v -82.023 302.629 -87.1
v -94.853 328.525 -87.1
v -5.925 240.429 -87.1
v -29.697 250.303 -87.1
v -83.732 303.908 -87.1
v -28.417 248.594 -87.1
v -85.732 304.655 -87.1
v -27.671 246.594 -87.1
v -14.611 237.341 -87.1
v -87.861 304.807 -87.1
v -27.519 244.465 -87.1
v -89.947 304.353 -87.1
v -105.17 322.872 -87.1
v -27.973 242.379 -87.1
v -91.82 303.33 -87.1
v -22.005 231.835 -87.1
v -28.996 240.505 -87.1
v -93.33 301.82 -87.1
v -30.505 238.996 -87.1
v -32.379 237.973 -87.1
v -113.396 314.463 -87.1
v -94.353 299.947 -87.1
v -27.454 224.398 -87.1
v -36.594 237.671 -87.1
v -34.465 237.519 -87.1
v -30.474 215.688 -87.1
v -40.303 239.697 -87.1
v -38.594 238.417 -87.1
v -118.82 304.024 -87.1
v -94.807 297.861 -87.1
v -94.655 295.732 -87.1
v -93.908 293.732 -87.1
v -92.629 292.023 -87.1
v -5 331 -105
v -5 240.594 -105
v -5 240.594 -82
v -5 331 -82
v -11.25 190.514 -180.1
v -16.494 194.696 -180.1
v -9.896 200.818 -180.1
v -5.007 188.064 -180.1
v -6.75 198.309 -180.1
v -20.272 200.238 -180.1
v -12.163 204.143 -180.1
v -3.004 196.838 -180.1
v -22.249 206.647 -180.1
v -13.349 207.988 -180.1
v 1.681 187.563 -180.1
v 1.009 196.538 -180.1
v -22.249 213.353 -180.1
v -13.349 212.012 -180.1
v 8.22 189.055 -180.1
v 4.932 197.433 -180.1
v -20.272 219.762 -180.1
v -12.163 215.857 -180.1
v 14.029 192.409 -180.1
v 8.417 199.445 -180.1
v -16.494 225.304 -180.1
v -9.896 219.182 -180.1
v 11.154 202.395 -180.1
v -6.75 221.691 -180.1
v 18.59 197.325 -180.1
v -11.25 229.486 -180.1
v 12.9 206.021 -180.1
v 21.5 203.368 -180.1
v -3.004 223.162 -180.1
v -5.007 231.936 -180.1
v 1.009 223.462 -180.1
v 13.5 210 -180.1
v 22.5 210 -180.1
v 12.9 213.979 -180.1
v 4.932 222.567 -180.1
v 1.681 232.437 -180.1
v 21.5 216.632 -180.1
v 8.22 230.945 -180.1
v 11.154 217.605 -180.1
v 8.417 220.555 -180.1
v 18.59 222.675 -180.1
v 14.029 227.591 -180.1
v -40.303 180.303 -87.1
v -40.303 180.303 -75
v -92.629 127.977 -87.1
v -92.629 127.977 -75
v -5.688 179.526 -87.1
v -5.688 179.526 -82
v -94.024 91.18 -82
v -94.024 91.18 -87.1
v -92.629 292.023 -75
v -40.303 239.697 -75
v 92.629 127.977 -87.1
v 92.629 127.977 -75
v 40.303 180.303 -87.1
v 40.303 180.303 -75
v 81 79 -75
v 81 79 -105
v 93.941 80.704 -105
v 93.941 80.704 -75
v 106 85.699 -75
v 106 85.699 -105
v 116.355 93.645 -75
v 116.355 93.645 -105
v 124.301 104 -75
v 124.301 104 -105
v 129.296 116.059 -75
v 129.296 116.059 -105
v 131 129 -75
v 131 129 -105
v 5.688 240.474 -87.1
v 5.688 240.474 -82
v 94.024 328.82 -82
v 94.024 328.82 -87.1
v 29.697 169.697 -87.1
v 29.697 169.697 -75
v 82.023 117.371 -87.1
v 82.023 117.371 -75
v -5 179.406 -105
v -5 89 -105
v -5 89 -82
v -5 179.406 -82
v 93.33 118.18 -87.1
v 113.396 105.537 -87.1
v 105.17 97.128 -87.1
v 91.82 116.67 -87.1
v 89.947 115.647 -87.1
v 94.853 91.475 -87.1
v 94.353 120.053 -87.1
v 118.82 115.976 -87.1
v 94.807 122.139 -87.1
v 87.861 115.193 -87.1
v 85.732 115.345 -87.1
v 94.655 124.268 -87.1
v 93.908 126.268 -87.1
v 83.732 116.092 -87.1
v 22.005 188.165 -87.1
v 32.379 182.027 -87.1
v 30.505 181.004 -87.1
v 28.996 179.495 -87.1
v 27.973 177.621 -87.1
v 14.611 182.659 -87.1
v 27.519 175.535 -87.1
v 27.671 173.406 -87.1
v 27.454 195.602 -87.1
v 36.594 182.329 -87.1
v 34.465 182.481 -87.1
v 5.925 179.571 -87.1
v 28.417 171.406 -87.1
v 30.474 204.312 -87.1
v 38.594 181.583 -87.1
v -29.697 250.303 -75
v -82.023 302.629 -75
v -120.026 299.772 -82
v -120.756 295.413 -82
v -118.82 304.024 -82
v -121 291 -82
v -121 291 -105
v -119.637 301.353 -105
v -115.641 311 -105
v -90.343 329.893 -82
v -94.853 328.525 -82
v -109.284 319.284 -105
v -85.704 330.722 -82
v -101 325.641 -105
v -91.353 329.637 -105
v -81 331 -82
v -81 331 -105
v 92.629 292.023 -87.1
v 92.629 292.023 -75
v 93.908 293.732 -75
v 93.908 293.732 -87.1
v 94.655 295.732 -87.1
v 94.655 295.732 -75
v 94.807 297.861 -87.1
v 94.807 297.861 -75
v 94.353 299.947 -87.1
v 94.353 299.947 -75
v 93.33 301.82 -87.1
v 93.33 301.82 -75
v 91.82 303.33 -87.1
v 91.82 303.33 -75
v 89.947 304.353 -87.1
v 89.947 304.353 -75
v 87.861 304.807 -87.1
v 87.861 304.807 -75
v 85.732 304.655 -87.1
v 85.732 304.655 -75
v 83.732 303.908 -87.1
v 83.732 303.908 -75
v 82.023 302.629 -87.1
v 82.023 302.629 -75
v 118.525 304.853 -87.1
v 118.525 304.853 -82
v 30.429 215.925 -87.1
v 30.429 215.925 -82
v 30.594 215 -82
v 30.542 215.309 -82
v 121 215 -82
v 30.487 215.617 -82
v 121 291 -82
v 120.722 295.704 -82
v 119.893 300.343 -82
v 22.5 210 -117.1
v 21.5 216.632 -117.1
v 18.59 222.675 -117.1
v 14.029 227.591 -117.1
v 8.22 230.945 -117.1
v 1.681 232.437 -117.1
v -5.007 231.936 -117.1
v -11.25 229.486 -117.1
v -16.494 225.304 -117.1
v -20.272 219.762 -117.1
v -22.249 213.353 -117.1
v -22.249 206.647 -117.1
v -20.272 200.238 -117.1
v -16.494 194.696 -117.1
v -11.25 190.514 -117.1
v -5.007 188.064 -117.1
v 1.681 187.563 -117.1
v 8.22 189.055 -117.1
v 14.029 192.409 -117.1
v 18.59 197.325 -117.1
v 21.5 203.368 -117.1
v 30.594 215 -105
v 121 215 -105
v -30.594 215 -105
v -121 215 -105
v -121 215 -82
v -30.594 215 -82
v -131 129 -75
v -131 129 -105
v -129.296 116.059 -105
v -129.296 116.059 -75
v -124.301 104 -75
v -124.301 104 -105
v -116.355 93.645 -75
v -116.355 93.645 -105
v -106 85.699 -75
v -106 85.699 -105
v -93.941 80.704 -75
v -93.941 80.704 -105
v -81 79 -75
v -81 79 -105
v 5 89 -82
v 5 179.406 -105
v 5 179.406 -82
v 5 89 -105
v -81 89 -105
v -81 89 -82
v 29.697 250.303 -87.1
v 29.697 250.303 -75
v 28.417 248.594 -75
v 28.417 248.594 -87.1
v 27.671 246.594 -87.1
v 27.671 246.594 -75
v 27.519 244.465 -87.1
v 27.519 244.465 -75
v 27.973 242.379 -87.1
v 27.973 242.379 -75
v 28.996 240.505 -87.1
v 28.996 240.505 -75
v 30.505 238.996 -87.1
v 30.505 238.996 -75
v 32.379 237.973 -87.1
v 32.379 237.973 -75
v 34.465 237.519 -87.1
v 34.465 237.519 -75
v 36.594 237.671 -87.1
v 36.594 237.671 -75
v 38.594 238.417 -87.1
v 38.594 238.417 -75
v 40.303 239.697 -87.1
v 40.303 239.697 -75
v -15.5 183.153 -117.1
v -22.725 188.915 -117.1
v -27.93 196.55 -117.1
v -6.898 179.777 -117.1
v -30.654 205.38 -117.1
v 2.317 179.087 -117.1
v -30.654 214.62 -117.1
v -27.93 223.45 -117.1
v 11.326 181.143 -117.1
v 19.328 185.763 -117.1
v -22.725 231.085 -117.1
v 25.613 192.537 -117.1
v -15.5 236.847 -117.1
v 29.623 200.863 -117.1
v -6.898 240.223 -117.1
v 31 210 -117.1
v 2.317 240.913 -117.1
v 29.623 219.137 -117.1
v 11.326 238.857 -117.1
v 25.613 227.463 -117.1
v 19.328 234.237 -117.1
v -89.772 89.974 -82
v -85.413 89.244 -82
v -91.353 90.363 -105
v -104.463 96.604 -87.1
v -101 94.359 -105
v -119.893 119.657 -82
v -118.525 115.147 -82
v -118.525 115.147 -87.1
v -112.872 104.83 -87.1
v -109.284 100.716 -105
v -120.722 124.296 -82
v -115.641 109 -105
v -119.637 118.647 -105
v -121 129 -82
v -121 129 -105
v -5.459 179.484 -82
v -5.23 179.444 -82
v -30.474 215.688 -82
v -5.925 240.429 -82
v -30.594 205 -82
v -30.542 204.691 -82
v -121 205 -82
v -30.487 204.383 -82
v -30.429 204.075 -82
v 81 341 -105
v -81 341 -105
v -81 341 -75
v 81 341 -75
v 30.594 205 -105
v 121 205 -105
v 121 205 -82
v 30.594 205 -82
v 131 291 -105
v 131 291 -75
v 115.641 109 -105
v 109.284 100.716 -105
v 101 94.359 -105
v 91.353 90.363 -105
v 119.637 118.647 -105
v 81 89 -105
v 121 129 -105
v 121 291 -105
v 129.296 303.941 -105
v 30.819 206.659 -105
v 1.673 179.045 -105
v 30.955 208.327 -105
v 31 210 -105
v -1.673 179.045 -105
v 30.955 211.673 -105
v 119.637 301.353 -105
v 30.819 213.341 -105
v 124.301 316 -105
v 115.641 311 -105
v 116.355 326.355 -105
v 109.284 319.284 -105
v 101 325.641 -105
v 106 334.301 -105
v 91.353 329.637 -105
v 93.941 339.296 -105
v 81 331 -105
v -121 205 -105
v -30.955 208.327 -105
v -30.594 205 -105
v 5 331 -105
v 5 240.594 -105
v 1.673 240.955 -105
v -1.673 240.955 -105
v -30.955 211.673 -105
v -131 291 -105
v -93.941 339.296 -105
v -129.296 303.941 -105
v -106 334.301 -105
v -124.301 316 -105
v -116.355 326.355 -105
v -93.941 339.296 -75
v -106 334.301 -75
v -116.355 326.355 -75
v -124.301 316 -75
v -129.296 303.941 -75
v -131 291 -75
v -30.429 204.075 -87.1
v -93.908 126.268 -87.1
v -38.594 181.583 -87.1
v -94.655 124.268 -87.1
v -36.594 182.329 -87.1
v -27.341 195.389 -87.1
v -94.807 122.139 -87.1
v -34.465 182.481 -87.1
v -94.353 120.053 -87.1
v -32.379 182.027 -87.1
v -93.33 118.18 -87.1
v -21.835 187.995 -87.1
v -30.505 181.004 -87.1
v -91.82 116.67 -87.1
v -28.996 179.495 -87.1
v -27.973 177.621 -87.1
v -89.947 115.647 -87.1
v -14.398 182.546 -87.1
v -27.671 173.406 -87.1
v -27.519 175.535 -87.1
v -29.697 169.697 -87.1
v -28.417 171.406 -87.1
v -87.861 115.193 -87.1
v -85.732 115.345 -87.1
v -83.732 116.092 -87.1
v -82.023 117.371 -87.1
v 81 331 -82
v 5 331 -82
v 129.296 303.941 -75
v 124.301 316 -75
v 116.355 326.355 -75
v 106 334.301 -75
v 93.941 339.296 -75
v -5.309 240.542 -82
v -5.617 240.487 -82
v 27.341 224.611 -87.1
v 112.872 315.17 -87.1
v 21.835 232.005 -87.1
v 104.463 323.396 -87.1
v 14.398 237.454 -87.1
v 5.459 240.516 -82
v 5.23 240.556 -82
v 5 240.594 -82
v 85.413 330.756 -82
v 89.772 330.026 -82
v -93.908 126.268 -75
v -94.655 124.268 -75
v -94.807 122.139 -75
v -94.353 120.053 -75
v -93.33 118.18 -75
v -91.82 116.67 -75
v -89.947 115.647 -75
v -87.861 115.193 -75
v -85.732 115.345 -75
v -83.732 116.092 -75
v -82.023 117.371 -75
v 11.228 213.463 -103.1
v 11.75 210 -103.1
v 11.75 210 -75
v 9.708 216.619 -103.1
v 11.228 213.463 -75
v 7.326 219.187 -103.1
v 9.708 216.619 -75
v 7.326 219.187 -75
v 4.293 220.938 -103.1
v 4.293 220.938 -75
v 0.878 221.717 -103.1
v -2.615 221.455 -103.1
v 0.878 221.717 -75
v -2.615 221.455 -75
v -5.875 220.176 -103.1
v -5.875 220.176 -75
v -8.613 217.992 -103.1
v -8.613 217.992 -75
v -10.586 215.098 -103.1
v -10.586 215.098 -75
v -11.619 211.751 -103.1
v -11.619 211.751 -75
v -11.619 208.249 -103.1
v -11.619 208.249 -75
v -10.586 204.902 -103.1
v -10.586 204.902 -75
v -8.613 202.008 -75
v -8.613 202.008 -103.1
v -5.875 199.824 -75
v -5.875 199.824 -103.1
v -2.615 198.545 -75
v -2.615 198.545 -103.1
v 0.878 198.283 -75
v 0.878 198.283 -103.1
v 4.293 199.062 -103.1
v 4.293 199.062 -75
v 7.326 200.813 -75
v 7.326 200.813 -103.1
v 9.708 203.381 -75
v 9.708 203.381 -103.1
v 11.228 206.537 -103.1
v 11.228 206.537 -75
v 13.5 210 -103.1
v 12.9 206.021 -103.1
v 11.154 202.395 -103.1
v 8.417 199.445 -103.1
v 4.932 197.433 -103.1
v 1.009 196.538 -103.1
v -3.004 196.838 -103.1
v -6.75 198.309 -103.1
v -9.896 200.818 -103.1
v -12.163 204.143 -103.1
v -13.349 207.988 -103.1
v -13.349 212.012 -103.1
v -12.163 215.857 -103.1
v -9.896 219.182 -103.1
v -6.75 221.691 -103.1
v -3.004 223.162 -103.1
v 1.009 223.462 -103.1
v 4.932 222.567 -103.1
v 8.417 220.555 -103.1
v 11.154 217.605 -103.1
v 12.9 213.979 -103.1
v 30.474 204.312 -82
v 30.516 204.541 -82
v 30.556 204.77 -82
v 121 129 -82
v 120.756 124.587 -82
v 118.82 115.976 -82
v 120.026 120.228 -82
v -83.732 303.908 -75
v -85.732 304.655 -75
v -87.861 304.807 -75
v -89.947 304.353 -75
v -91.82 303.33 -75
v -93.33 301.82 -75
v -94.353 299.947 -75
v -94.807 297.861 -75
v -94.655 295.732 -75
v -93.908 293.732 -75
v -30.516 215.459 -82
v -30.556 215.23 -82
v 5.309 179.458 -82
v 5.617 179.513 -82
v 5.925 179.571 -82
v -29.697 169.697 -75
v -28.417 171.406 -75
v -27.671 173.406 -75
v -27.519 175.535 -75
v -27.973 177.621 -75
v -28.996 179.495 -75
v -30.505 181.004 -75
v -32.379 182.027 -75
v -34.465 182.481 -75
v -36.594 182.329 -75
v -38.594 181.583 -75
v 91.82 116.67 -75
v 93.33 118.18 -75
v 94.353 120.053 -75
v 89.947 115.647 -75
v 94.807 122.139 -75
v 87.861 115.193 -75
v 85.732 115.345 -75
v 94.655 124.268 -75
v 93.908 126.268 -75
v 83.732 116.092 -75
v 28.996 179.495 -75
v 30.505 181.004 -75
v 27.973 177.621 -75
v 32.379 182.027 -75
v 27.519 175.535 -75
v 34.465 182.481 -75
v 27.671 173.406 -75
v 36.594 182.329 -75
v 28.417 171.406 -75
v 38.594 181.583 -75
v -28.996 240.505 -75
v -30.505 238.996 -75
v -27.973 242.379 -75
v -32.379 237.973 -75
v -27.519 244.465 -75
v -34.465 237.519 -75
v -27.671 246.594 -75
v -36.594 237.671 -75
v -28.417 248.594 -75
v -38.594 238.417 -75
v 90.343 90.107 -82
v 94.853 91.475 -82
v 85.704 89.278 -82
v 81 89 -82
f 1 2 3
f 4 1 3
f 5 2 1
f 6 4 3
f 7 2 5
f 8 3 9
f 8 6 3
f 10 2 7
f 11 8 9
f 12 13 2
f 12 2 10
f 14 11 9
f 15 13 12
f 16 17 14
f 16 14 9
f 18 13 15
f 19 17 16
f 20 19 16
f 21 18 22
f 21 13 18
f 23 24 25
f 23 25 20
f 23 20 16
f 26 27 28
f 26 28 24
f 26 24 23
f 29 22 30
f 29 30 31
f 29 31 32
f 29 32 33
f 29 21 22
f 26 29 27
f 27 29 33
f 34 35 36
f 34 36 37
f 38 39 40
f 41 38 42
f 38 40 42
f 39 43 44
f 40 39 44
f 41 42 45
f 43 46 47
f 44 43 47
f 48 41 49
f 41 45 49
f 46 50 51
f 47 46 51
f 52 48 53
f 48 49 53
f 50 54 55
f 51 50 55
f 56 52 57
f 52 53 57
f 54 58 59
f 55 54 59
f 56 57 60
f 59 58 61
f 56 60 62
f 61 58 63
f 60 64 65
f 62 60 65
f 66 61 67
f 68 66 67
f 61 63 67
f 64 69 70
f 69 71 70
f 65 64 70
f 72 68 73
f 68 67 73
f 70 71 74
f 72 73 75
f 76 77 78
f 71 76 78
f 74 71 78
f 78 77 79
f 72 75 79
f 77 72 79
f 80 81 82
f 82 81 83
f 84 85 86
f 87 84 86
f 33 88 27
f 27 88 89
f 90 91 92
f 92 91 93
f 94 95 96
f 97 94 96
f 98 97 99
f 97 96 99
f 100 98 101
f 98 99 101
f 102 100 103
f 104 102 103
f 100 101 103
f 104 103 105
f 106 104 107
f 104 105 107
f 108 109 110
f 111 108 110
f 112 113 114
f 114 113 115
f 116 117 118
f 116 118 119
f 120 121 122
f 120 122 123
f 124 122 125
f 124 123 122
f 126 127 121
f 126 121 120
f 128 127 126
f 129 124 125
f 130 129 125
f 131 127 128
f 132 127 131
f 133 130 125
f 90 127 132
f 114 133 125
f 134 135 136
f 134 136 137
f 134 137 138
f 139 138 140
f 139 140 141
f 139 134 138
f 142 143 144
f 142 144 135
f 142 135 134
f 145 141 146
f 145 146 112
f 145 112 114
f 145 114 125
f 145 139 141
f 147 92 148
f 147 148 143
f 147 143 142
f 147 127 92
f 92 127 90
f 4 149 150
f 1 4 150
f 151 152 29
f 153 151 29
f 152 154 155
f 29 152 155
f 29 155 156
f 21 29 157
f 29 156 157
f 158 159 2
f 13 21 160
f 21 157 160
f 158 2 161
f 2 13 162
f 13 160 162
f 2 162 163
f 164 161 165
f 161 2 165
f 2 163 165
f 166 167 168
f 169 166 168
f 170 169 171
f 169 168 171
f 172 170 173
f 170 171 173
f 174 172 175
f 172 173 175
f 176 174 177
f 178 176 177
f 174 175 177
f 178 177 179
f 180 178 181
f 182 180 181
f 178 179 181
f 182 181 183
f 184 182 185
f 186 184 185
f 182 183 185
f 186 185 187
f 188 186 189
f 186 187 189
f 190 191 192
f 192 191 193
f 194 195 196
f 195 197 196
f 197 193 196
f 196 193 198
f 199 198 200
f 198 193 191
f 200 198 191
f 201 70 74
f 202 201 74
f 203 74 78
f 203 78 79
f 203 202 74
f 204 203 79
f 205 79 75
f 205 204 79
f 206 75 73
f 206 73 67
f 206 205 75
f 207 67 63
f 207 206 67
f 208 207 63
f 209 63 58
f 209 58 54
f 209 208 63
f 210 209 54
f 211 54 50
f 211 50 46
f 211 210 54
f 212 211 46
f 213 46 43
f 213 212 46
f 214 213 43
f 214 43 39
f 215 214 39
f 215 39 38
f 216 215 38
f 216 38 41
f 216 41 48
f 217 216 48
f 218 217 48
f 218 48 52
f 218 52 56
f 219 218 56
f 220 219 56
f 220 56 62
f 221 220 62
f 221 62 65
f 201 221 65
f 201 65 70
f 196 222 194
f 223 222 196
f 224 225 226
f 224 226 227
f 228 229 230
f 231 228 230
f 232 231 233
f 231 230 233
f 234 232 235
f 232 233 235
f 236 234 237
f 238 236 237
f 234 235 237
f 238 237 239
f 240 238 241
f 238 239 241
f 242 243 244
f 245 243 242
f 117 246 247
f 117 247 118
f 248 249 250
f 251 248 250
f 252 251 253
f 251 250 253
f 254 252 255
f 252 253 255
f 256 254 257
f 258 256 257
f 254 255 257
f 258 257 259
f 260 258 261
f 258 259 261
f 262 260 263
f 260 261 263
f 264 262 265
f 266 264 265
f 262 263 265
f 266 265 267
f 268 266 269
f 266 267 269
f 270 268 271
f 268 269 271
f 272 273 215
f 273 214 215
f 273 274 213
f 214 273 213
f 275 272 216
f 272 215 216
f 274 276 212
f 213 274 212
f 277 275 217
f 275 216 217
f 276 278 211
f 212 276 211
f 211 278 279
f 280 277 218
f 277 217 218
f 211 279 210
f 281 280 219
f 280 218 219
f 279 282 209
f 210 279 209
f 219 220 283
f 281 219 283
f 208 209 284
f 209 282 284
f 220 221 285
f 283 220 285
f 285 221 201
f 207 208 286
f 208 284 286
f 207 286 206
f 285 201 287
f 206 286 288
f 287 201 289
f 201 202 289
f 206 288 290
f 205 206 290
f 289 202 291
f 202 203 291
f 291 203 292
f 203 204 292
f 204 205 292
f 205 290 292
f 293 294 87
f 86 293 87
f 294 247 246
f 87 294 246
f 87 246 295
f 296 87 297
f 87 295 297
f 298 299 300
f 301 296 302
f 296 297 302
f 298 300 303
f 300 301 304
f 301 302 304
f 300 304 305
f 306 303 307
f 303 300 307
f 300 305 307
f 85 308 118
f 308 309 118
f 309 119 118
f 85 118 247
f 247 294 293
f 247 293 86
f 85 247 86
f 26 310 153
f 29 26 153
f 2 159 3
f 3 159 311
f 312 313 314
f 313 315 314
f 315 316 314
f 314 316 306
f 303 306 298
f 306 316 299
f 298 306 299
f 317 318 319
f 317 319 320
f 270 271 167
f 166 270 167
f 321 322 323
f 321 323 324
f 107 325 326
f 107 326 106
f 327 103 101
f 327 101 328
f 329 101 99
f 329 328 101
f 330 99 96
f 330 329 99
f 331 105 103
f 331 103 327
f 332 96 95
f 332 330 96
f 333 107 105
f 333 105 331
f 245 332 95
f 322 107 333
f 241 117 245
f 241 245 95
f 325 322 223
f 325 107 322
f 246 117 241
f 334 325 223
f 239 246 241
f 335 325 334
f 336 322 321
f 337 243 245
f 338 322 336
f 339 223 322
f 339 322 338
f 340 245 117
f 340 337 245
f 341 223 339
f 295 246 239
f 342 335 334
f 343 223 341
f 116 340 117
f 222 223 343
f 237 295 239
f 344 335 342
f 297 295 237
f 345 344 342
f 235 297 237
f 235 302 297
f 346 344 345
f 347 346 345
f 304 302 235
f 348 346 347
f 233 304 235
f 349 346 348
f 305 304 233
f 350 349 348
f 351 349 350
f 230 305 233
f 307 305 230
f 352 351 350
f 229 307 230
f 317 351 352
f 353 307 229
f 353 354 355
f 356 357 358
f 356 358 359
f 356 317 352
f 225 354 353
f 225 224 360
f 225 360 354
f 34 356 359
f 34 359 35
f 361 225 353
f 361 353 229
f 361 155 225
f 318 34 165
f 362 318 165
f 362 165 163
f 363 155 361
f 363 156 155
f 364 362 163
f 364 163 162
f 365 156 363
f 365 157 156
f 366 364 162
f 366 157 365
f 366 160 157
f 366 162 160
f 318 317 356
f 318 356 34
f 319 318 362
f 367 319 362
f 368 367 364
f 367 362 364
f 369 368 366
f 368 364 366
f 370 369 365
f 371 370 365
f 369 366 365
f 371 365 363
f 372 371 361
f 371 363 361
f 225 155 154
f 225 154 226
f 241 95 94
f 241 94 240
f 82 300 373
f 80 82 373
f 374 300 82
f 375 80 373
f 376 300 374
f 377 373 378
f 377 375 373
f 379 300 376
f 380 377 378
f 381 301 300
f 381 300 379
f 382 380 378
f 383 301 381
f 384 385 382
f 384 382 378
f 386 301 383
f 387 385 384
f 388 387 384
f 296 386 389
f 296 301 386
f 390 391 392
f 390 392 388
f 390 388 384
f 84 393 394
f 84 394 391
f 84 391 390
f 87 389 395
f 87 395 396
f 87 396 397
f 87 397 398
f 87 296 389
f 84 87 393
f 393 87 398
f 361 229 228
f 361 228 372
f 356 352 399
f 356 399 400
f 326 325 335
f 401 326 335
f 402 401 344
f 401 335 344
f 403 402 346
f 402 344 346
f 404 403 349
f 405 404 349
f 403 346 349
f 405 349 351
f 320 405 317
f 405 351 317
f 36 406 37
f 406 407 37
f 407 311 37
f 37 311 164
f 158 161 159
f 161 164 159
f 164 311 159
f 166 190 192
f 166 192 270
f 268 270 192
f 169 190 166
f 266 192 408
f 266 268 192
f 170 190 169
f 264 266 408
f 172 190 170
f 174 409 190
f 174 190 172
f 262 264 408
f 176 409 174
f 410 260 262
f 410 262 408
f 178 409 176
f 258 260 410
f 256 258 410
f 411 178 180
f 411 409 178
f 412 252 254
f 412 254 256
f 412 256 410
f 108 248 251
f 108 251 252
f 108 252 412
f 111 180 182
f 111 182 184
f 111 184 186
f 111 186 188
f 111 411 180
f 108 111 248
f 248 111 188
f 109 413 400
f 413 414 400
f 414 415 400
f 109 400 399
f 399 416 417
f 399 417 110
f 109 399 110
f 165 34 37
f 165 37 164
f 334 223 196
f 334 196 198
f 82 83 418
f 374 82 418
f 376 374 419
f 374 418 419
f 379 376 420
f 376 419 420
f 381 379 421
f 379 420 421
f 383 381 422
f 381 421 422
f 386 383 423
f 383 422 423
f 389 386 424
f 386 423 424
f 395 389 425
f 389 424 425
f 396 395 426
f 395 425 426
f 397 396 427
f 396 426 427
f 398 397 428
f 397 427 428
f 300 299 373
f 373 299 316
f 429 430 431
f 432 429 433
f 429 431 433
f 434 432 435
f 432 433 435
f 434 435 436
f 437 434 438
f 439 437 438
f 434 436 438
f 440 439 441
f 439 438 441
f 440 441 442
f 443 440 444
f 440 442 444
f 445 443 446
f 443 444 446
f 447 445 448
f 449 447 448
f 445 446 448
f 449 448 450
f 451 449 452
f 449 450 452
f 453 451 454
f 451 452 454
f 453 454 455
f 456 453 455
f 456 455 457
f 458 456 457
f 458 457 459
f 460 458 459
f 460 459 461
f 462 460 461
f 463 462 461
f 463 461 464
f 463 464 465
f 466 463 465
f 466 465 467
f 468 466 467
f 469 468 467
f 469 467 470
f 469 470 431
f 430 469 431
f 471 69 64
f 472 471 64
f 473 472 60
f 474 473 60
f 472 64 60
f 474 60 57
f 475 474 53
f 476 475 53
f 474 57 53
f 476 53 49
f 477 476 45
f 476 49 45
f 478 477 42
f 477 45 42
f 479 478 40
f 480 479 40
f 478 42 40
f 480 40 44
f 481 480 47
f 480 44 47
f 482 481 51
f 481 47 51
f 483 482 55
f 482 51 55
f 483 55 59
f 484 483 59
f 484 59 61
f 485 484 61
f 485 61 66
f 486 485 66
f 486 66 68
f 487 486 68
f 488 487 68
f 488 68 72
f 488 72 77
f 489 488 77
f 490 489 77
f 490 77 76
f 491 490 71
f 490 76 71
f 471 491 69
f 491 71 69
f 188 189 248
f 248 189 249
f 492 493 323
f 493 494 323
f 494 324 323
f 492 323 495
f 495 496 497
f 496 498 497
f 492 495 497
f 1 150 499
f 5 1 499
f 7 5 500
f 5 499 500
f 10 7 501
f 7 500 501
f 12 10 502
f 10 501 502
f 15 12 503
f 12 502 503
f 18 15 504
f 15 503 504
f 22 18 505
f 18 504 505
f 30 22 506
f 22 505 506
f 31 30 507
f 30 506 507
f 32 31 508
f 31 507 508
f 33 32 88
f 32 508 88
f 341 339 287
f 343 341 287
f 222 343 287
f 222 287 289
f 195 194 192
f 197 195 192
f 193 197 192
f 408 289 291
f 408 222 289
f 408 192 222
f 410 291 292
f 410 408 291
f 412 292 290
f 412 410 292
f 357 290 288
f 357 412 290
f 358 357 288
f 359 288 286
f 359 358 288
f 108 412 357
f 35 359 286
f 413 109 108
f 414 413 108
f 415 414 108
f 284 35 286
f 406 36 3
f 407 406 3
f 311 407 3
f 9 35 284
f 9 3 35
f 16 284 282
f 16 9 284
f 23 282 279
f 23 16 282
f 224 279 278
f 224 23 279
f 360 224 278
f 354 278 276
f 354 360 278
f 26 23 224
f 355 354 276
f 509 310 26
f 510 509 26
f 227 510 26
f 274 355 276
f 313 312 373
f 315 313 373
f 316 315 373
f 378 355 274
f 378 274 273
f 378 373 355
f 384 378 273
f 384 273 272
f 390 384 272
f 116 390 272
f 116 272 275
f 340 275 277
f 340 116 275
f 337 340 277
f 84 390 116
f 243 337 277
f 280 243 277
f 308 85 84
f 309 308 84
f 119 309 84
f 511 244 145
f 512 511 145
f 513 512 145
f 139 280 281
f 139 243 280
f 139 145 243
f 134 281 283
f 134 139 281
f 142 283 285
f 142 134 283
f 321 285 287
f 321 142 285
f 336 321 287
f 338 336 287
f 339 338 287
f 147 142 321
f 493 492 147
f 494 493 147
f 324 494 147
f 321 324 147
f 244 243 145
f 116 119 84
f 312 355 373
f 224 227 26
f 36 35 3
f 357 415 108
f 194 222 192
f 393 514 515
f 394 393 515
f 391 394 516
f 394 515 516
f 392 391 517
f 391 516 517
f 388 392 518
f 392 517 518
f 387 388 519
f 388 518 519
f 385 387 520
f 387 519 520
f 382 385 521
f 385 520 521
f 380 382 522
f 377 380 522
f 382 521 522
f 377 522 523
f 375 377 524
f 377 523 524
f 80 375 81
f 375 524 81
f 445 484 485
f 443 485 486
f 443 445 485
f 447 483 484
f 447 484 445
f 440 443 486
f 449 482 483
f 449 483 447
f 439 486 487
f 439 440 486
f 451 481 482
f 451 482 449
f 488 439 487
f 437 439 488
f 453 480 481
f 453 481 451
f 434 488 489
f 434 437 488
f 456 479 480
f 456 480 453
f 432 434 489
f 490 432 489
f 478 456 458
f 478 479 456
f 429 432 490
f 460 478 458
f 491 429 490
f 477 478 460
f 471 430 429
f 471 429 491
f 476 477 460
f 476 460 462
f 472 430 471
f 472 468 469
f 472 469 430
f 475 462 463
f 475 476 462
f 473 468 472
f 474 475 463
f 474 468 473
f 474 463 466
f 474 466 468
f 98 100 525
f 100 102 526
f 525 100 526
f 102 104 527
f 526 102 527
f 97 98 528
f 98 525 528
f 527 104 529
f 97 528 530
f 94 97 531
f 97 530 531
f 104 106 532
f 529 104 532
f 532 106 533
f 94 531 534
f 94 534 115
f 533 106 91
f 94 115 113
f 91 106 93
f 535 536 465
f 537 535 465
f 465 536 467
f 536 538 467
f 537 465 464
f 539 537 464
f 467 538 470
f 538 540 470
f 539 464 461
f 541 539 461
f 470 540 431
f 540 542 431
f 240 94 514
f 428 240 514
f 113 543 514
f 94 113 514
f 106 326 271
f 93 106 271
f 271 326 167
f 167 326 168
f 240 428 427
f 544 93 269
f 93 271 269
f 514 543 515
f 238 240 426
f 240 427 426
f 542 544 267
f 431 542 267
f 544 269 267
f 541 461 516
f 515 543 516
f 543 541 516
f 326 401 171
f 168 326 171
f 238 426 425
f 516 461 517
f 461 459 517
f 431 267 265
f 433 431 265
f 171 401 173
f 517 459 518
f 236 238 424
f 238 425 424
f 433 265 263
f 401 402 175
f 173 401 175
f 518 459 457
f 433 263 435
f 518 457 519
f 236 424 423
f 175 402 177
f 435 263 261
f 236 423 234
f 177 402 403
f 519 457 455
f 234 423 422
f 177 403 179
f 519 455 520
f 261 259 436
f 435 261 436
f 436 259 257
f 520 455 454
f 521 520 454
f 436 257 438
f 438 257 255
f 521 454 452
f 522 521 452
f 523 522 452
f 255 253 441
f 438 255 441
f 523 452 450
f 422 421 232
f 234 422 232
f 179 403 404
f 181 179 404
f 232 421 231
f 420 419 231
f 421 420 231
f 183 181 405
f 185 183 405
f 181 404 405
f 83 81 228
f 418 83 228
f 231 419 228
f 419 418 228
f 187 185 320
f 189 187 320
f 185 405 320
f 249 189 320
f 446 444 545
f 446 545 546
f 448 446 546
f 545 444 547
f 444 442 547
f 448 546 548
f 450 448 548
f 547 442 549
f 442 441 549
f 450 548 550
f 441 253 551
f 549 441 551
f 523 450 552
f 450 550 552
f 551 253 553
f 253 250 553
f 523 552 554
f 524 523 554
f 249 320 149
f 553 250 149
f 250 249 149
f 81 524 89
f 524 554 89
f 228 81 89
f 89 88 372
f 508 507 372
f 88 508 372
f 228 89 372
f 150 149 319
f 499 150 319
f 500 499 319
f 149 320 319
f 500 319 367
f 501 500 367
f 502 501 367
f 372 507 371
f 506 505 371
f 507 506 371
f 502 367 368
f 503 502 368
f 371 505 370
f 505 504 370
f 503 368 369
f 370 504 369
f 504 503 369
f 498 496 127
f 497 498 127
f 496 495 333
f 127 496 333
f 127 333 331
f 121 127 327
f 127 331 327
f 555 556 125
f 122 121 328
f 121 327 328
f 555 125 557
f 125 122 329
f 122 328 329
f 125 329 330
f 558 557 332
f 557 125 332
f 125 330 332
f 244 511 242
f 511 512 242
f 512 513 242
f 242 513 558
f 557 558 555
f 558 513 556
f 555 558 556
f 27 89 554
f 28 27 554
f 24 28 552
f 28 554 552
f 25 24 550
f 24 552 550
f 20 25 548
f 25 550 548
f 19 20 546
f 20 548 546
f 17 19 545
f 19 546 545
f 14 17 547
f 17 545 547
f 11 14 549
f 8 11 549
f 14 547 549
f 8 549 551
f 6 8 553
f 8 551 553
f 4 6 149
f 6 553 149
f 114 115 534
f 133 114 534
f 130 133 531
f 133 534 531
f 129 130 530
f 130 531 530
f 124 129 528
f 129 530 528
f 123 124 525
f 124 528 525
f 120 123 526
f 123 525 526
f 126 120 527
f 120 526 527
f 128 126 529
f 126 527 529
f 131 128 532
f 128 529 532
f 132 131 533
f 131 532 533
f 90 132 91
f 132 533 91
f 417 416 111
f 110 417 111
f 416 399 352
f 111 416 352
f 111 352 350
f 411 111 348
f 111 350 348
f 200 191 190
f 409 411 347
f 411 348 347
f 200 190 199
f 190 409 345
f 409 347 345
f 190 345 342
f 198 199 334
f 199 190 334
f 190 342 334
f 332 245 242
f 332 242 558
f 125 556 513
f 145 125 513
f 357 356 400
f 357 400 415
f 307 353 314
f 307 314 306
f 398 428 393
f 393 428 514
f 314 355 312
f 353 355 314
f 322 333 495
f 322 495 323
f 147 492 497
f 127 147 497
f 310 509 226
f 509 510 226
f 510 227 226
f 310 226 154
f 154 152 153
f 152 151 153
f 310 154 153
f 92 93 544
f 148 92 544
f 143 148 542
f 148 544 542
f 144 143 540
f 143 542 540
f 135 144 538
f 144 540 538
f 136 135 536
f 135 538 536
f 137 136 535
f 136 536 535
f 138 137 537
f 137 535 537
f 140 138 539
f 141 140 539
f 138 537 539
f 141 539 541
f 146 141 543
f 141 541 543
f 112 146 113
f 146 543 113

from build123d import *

# Parameters (mm, degrees)
PAD002_DEPTH          = 30
POCKET024_DEPTH       = 23
POLARPATTERN_COUNT    = 4
PAD013_DEPTH          = 12
POLARPATTERN001_COUNT = 4
SKETCH039_R           = 31
PAD014_DEPTH          = 42
SKETCH040_R           = 22.5
PAD015_DEPTH          = 105
SKETCH041_R           = 13.5
POCKET025_DEPTH       = 77
SKETCH042_R           = 11.75
POCKET026_DEPTH       = 50
POCKET027_DEPTH       = 15
POLARPATTERN002_COUNT = 4


with BuildPart() as part:
    # Sketch005 → Pad002 (new body)
    with BuildSketch(Plane.XY):
        with BuildLine():
            Line((-81, 131), (81, 131))
            ThreePointArc((131, 81), (116.355339, 116.355339), (81, 131))
            Line((131, 81), (131, -81))
            ThreePointArc((81, -131), (116.355339, -116.355339), (131, -81))
            Line((81, -131), (-81, -131))
            ThreePointArc((-131, -81), (-116.355339, -116.355339), (-81, -131))
            Line((-131, -81), (-131, 81))
            ThreePointArc((-81, 131), (-116.355339, 116.355339), (-131, 81))
        make_face()
    extrude(amount=PAD002_DEPTH)

    # Sketch037 (on Face9 of Pad002) → Pocket024 (cut)
    with BuildSketch(Plane(origin=(0, 0, 0), x_dir=(1, 0, 0), z_dir=(0, 0, -1))):
        with BuildLine():
            Line((-81, 121), (-5, 121))
            Line((-5, 121), (-5, 5))
            Line((-5, 5), (-121, 5))
            Line((-121, 5), (-121, 81))
            ThreePointArc((-81, 121), (-109.284271, 109.284271), (-121, 81))
        make_face()
    pocket024 = extrude(amount=-POCKET024_DEPTH, mode=Mode.SUBTRACT)

    # PolarPattern: Pocket024 ×4 about axis
    polarpattern_axis = Axis((0, 0, 0), (0, 0, -1))
    for i in range(1, POLARPATTERN_COUNT):
        add(pocket024.rotate(polarpattern_axis, i * 360 / POLARPATTERN_COUNT), mode=Mode.SUBTRACT)

    # Sketch038 (on Face5 of PolarPattern) → Pad013 (join)
    with BuildSketch(Plane.XY.offset(29.9)):
        Polygon((-12.391874, 12.391877), (99.536252, 124.332785), (105.391106, 122.550873), (110, 120), (120, 110), (124.952294, 101.341048), (12.337305, -12.337366), align=None)
    pad013 = extrude(amount=-PAD013_DEPTH)

    # PolarPattern001: Pad013 ×4 about axis
    polarpattern001_axis = Axis((0, 0, 29.9), (0, 0, 1))
    for i in range(1, POLARPATTERN001_COUNT):
        add(pad013.rotate(polarpattern001_axis, i * 360 / POLARPATTERN001_COUNT))

    # Sketch039 (on Face5 of PolarPattern001) → Pad014 (join)
    with BuildSketch(Plane.XY.offset(29.9)):
        Circle(SKETCH039_R)
    extrude(amount=-PAD014_DEPTH)

    # Sketch040 (on Face5 of Pad014) → Pad015 (join)
    with BuildSketch(Plane.XY.offset(29.9)):
        Circle(SKETCH040_R)
    extrude(amount=-PAD015_DEPTH)

    # Sketch041 (on Face54 of Pad015) → Pocket025 (cut)
    with BuildSketch(Plane(origin=(0, 0, -75.1), x_dir=(1, 0, 0), z_dir=(0, 0, -1))):
        Circle(SKETCH041_R)
    extrude(amount=-POCKET025_DEPTH, mode=Mode.SUBTRACT)

    # Sketch042 (on Face5 of Pocket025) → Pocket026 (cut)
    with BuildSketch(Plane.XY.offset(30)):
        Circle(SKETCH042_R)
    extrude(amount=-POCKET026_DEPTH, mode=Mode.SUBTRACT)

    # Sketch043 (on Face5 of Pocket026) → Pocket027 (cut)
    with BuildSketch(Plane.XY.offset(30)):
        with BuildLine():
            ThreePointArc((29.696699, 40.303301), (29.696699, 29.696699), (40.303301, 29.696699))
            Line((40.303301, 29.696699), (92.629203, 82.022601))
            ThreePointArc((92.629203, 82.022601), (92.629203, 92.629203), (82.022601, 92.629203))
            Line((82.022601, 92.629203), (29.696699, 40.303301))
        make_face()
    pocket027 = extrude(amount=-POCKET027_DEPTH, mode=Mode.SUBTRACT)

    # PolarPattern002: Pocket027 ×4 about axis
    polarpattern002_axis = Axis((0, 0, 30), (0, 0, 1))
    for i in range(1, POLARPATTERN002_COUNT):
        add(pocket027.rotate(polarpattern002_axis, i * 360 / POLARPATTERN002_COUNT), mode=Mode.SUBTRACT)


with BuildPart() as part_1:
    # Body002 placement: moved
    add(part.part.moved(Location((0, 210, -105))))


solid = part_1.part
